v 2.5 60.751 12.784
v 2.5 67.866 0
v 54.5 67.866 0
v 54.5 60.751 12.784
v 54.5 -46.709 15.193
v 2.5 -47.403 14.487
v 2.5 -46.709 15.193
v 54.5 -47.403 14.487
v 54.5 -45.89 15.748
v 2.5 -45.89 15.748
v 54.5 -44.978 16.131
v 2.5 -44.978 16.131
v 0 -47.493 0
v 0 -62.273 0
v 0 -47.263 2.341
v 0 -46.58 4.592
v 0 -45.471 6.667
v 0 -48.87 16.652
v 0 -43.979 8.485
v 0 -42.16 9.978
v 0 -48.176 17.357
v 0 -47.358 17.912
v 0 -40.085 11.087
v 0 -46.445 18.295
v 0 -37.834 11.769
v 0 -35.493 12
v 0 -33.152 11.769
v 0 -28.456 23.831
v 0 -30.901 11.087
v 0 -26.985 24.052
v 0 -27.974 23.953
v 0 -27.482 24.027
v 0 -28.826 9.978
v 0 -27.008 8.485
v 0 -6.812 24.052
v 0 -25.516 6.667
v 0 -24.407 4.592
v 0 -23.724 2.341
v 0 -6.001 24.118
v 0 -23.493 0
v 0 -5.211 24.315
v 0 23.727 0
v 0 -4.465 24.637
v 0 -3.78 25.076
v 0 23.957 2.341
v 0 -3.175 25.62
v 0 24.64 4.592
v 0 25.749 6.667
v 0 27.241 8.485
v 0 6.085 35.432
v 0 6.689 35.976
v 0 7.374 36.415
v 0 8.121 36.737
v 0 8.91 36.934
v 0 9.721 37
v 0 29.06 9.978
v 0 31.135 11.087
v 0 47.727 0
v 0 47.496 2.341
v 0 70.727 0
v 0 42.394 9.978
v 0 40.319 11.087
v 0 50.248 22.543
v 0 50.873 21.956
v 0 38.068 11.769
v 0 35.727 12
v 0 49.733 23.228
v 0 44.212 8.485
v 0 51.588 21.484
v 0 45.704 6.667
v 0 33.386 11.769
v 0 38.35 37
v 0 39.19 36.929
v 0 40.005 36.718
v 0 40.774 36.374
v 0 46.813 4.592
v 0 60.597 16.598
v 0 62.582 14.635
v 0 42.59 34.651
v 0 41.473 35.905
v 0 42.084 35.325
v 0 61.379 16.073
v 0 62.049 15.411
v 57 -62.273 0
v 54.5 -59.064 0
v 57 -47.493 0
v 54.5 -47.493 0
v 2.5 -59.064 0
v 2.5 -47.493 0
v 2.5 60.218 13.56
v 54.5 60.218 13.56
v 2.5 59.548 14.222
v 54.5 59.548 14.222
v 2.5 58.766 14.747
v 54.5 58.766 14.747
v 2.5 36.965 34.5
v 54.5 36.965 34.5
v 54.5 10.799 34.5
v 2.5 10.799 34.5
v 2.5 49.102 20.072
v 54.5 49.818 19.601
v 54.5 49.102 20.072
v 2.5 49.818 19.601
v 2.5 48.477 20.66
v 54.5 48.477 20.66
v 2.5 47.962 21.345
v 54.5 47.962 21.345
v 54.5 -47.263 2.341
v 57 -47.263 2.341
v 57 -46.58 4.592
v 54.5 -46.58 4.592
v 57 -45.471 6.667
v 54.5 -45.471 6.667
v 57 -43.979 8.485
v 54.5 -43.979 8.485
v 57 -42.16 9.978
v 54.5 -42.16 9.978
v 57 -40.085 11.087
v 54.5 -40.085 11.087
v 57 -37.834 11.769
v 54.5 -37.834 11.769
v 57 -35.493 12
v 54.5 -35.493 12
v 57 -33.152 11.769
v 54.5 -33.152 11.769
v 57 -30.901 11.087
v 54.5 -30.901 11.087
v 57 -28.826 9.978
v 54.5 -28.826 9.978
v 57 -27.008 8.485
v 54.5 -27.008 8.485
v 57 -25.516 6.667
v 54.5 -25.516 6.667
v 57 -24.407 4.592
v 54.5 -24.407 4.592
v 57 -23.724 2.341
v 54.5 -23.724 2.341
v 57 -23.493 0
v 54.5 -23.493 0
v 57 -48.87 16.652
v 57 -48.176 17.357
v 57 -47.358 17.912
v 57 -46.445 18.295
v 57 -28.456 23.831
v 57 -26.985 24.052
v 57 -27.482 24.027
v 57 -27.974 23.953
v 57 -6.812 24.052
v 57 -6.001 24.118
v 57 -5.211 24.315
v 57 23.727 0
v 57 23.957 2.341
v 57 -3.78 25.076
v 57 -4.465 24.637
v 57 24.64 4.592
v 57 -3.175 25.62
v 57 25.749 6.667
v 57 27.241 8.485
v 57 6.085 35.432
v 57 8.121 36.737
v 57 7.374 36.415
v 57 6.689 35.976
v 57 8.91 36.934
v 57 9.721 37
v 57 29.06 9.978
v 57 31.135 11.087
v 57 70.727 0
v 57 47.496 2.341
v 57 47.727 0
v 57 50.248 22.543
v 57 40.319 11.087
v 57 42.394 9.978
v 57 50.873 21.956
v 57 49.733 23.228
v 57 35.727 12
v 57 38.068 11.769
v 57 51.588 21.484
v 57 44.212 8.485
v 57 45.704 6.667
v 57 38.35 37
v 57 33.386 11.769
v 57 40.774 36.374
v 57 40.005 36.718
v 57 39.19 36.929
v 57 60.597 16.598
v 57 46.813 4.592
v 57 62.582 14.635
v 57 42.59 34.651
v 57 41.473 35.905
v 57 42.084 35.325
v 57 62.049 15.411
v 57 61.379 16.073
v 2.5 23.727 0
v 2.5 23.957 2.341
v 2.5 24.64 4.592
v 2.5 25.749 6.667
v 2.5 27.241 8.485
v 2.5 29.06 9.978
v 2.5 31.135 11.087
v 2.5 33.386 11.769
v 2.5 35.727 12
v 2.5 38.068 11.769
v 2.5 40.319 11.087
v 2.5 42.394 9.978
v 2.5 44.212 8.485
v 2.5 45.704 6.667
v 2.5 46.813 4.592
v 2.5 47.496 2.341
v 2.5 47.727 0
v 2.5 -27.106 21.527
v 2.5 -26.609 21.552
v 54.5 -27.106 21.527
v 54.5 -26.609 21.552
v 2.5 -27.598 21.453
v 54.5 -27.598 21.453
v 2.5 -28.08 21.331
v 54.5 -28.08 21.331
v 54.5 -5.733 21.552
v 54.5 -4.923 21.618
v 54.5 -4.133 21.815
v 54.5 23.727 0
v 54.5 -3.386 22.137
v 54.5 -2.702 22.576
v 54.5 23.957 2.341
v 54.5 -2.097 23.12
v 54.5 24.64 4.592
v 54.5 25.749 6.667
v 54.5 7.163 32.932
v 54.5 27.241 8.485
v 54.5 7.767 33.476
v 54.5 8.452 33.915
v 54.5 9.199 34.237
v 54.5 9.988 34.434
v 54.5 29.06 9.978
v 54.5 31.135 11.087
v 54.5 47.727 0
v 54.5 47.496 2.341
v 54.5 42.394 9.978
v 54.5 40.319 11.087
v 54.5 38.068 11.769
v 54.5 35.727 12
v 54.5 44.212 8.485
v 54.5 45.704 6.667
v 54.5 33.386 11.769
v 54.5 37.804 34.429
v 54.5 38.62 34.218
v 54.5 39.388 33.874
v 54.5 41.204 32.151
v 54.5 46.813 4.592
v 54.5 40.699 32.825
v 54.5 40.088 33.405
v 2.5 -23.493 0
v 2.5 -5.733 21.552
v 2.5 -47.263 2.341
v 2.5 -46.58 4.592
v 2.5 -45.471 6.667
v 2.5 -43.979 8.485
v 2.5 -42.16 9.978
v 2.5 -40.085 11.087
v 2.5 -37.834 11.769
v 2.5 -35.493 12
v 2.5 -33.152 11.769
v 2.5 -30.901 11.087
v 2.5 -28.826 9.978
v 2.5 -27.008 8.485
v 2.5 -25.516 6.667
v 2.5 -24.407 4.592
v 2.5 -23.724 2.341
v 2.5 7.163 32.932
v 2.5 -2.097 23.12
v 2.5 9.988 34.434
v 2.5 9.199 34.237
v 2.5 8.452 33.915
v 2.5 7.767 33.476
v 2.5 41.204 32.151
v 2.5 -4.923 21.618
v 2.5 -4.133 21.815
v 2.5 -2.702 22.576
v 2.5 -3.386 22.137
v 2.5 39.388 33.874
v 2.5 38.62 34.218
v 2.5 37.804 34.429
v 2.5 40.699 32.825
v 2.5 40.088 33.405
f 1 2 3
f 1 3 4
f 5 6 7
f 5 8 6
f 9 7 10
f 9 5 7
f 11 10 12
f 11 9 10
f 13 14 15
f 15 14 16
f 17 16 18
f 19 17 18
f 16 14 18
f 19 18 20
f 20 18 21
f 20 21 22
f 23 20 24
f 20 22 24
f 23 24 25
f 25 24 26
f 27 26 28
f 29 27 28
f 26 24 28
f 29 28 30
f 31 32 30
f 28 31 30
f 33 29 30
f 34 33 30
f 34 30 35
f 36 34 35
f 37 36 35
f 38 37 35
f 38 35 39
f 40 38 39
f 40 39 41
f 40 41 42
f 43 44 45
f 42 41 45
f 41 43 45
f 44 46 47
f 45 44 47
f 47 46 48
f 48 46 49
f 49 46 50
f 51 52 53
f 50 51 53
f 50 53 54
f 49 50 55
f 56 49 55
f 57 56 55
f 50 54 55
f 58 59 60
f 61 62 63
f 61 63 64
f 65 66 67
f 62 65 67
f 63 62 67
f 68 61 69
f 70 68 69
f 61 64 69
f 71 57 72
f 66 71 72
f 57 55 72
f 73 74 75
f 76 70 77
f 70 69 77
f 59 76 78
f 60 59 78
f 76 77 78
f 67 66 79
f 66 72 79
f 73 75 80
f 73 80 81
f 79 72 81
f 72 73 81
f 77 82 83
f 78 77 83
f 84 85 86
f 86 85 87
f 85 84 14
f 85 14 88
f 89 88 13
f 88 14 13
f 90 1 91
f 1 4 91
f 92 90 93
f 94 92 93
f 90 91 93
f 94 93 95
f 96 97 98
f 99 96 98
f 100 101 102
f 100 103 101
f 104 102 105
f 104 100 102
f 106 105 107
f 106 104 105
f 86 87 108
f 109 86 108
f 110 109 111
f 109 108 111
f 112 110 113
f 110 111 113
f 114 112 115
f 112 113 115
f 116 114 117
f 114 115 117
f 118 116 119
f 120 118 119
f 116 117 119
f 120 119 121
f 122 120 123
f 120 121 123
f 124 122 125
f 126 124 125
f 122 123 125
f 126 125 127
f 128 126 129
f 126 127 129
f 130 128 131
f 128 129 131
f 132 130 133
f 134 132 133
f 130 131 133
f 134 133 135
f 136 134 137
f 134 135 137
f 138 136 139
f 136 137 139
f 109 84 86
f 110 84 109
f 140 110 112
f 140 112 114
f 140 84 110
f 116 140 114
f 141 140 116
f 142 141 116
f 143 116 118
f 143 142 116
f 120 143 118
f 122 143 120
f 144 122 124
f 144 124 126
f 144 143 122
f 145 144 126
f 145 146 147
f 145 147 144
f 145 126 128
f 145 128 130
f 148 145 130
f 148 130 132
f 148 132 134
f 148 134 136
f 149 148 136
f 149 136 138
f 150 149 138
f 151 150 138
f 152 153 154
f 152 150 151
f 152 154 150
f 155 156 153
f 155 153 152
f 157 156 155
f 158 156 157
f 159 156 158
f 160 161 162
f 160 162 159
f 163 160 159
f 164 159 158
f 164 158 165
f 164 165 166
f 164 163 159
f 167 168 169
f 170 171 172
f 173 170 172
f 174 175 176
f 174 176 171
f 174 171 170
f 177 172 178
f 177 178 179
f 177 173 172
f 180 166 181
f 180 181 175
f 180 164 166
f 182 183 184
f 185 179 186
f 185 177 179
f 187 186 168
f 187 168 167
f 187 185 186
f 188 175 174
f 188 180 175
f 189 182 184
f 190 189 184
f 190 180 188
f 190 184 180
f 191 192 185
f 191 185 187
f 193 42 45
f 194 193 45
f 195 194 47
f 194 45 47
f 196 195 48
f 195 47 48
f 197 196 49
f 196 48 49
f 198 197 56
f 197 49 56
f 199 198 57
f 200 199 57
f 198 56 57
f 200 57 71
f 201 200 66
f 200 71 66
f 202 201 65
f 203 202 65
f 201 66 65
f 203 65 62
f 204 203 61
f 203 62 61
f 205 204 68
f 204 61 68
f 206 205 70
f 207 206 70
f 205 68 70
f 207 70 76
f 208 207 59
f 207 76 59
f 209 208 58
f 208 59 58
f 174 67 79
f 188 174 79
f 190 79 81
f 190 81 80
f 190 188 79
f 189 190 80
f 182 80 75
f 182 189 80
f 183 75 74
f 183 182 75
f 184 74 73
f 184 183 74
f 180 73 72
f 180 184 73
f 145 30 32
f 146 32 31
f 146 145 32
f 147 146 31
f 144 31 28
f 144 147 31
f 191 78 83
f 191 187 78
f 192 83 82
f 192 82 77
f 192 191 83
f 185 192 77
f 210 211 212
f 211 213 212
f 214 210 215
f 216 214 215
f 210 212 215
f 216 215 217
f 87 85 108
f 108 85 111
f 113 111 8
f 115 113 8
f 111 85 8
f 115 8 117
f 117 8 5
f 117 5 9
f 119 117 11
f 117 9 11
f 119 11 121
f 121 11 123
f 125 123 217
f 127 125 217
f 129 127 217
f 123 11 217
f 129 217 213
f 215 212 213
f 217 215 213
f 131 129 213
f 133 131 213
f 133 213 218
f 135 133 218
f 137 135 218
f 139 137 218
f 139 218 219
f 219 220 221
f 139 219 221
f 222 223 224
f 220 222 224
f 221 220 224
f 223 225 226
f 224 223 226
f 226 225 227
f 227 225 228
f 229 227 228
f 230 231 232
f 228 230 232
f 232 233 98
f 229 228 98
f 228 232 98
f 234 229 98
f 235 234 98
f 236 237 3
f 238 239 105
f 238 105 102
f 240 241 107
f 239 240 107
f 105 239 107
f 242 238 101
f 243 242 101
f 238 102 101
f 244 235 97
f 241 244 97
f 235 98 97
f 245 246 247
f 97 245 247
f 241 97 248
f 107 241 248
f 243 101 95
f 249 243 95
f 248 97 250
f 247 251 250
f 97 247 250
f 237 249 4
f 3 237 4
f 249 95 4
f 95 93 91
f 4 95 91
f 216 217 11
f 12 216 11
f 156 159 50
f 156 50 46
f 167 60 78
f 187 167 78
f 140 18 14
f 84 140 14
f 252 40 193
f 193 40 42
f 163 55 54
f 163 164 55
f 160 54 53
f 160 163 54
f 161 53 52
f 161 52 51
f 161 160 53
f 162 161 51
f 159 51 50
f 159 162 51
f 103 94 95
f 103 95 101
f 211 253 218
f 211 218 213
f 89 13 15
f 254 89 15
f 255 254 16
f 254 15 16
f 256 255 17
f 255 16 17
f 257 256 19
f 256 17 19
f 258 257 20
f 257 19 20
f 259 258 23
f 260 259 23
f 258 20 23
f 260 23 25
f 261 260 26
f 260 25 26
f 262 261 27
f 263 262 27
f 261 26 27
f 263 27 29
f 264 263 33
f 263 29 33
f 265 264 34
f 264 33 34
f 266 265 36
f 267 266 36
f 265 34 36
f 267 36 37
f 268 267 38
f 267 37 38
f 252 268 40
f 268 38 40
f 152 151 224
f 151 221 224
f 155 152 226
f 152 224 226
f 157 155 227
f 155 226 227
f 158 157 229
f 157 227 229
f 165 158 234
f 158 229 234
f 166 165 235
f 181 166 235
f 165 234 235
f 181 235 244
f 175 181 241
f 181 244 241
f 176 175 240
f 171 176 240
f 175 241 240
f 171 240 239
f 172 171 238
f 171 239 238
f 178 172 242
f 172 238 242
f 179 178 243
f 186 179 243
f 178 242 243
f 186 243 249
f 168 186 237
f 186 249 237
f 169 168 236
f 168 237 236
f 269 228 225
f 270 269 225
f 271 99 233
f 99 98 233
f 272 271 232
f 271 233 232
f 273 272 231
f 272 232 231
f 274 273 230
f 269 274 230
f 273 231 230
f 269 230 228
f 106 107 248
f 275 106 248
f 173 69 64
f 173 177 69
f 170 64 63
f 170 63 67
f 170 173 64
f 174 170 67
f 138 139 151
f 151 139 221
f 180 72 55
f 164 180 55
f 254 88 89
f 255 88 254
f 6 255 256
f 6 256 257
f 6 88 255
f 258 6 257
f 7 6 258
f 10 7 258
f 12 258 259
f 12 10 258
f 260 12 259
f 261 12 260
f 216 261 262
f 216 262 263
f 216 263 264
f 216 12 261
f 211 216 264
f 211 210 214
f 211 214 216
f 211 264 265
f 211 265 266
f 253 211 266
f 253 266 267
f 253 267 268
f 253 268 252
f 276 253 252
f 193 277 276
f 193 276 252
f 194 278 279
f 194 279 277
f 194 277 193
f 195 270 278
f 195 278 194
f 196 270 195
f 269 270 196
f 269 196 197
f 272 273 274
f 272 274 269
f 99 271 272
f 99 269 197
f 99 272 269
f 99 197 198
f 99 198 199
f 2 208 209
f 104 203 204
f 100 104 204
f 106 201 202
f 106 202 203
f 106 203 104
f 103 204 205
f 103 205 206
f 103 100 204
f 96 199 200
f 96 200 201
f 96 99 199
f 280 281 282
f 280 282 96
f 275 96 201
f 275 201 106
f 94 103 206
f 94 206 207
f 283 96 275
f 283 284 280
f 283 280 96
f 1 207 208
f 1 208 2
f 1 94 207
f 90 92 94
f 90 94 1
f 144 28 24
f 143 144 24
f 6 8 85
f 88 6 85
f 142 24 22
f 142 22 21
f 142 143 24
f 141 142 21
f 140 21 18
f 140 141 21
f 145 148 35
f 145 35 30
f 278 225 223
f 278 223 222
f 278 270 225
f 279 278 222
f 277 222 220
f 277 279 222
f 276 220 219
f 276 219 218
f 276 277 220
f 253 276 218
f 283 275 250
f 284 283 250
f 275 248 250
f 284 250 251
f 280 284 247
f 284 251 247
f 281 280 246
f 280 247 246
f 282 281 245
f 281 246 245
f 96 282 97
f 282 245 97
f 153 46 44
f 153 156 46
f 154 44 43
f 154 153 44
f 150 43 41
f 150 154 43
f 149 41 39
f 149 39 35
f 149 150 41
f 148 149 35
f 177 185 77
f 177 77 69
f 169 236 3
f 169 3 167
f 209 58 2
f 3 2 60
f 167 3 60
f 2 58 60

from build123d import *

# Parameters (mm, degrees)
F1_DEPTH = 57
F2_T     = -2.5
F3_R     = 5
F4_R     = 5


with BuildPart() as f1:
    # F0 (on Right) → F1 (new body)
    with BuildSketch(Plane.YZ):
        with BuildLine():
            ThreePointArc((23.7267759775, 0), (35.7267759775, 12), (47.7267759775, 0))
            Line((47.7267759775, 0), (70.7267759775, 0))
            Line((70.7267759775, 0), (61.8750043213, 15.9051734954))
            Line((61.8750043213, 15.9051734954), (50.431035459, 22.1120696515))
            Line((50.431035459, 22.1120696515), (41.1206930876, 37))
            Line((41.1206930876, 37), (7.5646545738, 37))
            Line((7.5646545738, 37), (-4.6551725827, 24.0517258644))
            Line((-4.6551725827, 24.0517258644), (-27.737069875, 24.0517258644))
            Line((-27.737069875, 24.0517258644), (-47.9094833136, 17.8448278457))
            Line((-47.9094833136, 17.8448278457), (-62.2732240225, 0))
            Line((-62.2732240225, 0), (-47.4932240225, 0))
            ThreePointArc((-47.4932240225, 0), (-35.4932240225, 12), (-23.4932240225, 0))
            Line((-23.4932240225, 0), (23.7267759775, 0))
        make_face()
    extrude(amount=F1_DEPTH)

    # F2
    f2_openings = [f1.faces().sort_by_distance(p)[0] for p in [
        (28.5, 0.116776, 0),
        (28.5, -35.493224, 12),
        (28.5, 35.726776, 12),
        (28.5, 59.226776, 0),
        (28.5, -54.883224, 0),
    ]]
    offset(amount=F2_T, openings=f2_openings, kind=Kind.INTERSECTION)

    # F3
    f3_edges = [f1.edges().sort_by_distance(p)[0] for p in [
        (28.5, -47.909483, 17.844828),
        (28.5, -27.73707, 24.051726),
        (28.5, -4.655173, 24.051726),
        (28.5, 7.564655, 37),
        (28.5, 41.120693, 37),
        (28.5, 50.431035, 22.11207),
        (28.5, 61.875004, 15.905173),
    ]]
    fillet(f3_edges, radius=F3_R)

    # F4
    f4_edges = [f1.edges().sort_by_distance(p)[0] for p in [
        (28.5, -46.44224, 15.68062),
        (28.5, -27.361151, 21.551726),
        (28.5, -3.577006, 21.551726),
        (28.5, 8.642822, 34.5),
        (28.5, 39.735499, 34.5),
        (28.5, 48.660441, 20.228354),
        (28.5, 60.044051, 14.054195),
    ]]
    fillet(f4_edges, radius=F4_R)


solid = f1.part
